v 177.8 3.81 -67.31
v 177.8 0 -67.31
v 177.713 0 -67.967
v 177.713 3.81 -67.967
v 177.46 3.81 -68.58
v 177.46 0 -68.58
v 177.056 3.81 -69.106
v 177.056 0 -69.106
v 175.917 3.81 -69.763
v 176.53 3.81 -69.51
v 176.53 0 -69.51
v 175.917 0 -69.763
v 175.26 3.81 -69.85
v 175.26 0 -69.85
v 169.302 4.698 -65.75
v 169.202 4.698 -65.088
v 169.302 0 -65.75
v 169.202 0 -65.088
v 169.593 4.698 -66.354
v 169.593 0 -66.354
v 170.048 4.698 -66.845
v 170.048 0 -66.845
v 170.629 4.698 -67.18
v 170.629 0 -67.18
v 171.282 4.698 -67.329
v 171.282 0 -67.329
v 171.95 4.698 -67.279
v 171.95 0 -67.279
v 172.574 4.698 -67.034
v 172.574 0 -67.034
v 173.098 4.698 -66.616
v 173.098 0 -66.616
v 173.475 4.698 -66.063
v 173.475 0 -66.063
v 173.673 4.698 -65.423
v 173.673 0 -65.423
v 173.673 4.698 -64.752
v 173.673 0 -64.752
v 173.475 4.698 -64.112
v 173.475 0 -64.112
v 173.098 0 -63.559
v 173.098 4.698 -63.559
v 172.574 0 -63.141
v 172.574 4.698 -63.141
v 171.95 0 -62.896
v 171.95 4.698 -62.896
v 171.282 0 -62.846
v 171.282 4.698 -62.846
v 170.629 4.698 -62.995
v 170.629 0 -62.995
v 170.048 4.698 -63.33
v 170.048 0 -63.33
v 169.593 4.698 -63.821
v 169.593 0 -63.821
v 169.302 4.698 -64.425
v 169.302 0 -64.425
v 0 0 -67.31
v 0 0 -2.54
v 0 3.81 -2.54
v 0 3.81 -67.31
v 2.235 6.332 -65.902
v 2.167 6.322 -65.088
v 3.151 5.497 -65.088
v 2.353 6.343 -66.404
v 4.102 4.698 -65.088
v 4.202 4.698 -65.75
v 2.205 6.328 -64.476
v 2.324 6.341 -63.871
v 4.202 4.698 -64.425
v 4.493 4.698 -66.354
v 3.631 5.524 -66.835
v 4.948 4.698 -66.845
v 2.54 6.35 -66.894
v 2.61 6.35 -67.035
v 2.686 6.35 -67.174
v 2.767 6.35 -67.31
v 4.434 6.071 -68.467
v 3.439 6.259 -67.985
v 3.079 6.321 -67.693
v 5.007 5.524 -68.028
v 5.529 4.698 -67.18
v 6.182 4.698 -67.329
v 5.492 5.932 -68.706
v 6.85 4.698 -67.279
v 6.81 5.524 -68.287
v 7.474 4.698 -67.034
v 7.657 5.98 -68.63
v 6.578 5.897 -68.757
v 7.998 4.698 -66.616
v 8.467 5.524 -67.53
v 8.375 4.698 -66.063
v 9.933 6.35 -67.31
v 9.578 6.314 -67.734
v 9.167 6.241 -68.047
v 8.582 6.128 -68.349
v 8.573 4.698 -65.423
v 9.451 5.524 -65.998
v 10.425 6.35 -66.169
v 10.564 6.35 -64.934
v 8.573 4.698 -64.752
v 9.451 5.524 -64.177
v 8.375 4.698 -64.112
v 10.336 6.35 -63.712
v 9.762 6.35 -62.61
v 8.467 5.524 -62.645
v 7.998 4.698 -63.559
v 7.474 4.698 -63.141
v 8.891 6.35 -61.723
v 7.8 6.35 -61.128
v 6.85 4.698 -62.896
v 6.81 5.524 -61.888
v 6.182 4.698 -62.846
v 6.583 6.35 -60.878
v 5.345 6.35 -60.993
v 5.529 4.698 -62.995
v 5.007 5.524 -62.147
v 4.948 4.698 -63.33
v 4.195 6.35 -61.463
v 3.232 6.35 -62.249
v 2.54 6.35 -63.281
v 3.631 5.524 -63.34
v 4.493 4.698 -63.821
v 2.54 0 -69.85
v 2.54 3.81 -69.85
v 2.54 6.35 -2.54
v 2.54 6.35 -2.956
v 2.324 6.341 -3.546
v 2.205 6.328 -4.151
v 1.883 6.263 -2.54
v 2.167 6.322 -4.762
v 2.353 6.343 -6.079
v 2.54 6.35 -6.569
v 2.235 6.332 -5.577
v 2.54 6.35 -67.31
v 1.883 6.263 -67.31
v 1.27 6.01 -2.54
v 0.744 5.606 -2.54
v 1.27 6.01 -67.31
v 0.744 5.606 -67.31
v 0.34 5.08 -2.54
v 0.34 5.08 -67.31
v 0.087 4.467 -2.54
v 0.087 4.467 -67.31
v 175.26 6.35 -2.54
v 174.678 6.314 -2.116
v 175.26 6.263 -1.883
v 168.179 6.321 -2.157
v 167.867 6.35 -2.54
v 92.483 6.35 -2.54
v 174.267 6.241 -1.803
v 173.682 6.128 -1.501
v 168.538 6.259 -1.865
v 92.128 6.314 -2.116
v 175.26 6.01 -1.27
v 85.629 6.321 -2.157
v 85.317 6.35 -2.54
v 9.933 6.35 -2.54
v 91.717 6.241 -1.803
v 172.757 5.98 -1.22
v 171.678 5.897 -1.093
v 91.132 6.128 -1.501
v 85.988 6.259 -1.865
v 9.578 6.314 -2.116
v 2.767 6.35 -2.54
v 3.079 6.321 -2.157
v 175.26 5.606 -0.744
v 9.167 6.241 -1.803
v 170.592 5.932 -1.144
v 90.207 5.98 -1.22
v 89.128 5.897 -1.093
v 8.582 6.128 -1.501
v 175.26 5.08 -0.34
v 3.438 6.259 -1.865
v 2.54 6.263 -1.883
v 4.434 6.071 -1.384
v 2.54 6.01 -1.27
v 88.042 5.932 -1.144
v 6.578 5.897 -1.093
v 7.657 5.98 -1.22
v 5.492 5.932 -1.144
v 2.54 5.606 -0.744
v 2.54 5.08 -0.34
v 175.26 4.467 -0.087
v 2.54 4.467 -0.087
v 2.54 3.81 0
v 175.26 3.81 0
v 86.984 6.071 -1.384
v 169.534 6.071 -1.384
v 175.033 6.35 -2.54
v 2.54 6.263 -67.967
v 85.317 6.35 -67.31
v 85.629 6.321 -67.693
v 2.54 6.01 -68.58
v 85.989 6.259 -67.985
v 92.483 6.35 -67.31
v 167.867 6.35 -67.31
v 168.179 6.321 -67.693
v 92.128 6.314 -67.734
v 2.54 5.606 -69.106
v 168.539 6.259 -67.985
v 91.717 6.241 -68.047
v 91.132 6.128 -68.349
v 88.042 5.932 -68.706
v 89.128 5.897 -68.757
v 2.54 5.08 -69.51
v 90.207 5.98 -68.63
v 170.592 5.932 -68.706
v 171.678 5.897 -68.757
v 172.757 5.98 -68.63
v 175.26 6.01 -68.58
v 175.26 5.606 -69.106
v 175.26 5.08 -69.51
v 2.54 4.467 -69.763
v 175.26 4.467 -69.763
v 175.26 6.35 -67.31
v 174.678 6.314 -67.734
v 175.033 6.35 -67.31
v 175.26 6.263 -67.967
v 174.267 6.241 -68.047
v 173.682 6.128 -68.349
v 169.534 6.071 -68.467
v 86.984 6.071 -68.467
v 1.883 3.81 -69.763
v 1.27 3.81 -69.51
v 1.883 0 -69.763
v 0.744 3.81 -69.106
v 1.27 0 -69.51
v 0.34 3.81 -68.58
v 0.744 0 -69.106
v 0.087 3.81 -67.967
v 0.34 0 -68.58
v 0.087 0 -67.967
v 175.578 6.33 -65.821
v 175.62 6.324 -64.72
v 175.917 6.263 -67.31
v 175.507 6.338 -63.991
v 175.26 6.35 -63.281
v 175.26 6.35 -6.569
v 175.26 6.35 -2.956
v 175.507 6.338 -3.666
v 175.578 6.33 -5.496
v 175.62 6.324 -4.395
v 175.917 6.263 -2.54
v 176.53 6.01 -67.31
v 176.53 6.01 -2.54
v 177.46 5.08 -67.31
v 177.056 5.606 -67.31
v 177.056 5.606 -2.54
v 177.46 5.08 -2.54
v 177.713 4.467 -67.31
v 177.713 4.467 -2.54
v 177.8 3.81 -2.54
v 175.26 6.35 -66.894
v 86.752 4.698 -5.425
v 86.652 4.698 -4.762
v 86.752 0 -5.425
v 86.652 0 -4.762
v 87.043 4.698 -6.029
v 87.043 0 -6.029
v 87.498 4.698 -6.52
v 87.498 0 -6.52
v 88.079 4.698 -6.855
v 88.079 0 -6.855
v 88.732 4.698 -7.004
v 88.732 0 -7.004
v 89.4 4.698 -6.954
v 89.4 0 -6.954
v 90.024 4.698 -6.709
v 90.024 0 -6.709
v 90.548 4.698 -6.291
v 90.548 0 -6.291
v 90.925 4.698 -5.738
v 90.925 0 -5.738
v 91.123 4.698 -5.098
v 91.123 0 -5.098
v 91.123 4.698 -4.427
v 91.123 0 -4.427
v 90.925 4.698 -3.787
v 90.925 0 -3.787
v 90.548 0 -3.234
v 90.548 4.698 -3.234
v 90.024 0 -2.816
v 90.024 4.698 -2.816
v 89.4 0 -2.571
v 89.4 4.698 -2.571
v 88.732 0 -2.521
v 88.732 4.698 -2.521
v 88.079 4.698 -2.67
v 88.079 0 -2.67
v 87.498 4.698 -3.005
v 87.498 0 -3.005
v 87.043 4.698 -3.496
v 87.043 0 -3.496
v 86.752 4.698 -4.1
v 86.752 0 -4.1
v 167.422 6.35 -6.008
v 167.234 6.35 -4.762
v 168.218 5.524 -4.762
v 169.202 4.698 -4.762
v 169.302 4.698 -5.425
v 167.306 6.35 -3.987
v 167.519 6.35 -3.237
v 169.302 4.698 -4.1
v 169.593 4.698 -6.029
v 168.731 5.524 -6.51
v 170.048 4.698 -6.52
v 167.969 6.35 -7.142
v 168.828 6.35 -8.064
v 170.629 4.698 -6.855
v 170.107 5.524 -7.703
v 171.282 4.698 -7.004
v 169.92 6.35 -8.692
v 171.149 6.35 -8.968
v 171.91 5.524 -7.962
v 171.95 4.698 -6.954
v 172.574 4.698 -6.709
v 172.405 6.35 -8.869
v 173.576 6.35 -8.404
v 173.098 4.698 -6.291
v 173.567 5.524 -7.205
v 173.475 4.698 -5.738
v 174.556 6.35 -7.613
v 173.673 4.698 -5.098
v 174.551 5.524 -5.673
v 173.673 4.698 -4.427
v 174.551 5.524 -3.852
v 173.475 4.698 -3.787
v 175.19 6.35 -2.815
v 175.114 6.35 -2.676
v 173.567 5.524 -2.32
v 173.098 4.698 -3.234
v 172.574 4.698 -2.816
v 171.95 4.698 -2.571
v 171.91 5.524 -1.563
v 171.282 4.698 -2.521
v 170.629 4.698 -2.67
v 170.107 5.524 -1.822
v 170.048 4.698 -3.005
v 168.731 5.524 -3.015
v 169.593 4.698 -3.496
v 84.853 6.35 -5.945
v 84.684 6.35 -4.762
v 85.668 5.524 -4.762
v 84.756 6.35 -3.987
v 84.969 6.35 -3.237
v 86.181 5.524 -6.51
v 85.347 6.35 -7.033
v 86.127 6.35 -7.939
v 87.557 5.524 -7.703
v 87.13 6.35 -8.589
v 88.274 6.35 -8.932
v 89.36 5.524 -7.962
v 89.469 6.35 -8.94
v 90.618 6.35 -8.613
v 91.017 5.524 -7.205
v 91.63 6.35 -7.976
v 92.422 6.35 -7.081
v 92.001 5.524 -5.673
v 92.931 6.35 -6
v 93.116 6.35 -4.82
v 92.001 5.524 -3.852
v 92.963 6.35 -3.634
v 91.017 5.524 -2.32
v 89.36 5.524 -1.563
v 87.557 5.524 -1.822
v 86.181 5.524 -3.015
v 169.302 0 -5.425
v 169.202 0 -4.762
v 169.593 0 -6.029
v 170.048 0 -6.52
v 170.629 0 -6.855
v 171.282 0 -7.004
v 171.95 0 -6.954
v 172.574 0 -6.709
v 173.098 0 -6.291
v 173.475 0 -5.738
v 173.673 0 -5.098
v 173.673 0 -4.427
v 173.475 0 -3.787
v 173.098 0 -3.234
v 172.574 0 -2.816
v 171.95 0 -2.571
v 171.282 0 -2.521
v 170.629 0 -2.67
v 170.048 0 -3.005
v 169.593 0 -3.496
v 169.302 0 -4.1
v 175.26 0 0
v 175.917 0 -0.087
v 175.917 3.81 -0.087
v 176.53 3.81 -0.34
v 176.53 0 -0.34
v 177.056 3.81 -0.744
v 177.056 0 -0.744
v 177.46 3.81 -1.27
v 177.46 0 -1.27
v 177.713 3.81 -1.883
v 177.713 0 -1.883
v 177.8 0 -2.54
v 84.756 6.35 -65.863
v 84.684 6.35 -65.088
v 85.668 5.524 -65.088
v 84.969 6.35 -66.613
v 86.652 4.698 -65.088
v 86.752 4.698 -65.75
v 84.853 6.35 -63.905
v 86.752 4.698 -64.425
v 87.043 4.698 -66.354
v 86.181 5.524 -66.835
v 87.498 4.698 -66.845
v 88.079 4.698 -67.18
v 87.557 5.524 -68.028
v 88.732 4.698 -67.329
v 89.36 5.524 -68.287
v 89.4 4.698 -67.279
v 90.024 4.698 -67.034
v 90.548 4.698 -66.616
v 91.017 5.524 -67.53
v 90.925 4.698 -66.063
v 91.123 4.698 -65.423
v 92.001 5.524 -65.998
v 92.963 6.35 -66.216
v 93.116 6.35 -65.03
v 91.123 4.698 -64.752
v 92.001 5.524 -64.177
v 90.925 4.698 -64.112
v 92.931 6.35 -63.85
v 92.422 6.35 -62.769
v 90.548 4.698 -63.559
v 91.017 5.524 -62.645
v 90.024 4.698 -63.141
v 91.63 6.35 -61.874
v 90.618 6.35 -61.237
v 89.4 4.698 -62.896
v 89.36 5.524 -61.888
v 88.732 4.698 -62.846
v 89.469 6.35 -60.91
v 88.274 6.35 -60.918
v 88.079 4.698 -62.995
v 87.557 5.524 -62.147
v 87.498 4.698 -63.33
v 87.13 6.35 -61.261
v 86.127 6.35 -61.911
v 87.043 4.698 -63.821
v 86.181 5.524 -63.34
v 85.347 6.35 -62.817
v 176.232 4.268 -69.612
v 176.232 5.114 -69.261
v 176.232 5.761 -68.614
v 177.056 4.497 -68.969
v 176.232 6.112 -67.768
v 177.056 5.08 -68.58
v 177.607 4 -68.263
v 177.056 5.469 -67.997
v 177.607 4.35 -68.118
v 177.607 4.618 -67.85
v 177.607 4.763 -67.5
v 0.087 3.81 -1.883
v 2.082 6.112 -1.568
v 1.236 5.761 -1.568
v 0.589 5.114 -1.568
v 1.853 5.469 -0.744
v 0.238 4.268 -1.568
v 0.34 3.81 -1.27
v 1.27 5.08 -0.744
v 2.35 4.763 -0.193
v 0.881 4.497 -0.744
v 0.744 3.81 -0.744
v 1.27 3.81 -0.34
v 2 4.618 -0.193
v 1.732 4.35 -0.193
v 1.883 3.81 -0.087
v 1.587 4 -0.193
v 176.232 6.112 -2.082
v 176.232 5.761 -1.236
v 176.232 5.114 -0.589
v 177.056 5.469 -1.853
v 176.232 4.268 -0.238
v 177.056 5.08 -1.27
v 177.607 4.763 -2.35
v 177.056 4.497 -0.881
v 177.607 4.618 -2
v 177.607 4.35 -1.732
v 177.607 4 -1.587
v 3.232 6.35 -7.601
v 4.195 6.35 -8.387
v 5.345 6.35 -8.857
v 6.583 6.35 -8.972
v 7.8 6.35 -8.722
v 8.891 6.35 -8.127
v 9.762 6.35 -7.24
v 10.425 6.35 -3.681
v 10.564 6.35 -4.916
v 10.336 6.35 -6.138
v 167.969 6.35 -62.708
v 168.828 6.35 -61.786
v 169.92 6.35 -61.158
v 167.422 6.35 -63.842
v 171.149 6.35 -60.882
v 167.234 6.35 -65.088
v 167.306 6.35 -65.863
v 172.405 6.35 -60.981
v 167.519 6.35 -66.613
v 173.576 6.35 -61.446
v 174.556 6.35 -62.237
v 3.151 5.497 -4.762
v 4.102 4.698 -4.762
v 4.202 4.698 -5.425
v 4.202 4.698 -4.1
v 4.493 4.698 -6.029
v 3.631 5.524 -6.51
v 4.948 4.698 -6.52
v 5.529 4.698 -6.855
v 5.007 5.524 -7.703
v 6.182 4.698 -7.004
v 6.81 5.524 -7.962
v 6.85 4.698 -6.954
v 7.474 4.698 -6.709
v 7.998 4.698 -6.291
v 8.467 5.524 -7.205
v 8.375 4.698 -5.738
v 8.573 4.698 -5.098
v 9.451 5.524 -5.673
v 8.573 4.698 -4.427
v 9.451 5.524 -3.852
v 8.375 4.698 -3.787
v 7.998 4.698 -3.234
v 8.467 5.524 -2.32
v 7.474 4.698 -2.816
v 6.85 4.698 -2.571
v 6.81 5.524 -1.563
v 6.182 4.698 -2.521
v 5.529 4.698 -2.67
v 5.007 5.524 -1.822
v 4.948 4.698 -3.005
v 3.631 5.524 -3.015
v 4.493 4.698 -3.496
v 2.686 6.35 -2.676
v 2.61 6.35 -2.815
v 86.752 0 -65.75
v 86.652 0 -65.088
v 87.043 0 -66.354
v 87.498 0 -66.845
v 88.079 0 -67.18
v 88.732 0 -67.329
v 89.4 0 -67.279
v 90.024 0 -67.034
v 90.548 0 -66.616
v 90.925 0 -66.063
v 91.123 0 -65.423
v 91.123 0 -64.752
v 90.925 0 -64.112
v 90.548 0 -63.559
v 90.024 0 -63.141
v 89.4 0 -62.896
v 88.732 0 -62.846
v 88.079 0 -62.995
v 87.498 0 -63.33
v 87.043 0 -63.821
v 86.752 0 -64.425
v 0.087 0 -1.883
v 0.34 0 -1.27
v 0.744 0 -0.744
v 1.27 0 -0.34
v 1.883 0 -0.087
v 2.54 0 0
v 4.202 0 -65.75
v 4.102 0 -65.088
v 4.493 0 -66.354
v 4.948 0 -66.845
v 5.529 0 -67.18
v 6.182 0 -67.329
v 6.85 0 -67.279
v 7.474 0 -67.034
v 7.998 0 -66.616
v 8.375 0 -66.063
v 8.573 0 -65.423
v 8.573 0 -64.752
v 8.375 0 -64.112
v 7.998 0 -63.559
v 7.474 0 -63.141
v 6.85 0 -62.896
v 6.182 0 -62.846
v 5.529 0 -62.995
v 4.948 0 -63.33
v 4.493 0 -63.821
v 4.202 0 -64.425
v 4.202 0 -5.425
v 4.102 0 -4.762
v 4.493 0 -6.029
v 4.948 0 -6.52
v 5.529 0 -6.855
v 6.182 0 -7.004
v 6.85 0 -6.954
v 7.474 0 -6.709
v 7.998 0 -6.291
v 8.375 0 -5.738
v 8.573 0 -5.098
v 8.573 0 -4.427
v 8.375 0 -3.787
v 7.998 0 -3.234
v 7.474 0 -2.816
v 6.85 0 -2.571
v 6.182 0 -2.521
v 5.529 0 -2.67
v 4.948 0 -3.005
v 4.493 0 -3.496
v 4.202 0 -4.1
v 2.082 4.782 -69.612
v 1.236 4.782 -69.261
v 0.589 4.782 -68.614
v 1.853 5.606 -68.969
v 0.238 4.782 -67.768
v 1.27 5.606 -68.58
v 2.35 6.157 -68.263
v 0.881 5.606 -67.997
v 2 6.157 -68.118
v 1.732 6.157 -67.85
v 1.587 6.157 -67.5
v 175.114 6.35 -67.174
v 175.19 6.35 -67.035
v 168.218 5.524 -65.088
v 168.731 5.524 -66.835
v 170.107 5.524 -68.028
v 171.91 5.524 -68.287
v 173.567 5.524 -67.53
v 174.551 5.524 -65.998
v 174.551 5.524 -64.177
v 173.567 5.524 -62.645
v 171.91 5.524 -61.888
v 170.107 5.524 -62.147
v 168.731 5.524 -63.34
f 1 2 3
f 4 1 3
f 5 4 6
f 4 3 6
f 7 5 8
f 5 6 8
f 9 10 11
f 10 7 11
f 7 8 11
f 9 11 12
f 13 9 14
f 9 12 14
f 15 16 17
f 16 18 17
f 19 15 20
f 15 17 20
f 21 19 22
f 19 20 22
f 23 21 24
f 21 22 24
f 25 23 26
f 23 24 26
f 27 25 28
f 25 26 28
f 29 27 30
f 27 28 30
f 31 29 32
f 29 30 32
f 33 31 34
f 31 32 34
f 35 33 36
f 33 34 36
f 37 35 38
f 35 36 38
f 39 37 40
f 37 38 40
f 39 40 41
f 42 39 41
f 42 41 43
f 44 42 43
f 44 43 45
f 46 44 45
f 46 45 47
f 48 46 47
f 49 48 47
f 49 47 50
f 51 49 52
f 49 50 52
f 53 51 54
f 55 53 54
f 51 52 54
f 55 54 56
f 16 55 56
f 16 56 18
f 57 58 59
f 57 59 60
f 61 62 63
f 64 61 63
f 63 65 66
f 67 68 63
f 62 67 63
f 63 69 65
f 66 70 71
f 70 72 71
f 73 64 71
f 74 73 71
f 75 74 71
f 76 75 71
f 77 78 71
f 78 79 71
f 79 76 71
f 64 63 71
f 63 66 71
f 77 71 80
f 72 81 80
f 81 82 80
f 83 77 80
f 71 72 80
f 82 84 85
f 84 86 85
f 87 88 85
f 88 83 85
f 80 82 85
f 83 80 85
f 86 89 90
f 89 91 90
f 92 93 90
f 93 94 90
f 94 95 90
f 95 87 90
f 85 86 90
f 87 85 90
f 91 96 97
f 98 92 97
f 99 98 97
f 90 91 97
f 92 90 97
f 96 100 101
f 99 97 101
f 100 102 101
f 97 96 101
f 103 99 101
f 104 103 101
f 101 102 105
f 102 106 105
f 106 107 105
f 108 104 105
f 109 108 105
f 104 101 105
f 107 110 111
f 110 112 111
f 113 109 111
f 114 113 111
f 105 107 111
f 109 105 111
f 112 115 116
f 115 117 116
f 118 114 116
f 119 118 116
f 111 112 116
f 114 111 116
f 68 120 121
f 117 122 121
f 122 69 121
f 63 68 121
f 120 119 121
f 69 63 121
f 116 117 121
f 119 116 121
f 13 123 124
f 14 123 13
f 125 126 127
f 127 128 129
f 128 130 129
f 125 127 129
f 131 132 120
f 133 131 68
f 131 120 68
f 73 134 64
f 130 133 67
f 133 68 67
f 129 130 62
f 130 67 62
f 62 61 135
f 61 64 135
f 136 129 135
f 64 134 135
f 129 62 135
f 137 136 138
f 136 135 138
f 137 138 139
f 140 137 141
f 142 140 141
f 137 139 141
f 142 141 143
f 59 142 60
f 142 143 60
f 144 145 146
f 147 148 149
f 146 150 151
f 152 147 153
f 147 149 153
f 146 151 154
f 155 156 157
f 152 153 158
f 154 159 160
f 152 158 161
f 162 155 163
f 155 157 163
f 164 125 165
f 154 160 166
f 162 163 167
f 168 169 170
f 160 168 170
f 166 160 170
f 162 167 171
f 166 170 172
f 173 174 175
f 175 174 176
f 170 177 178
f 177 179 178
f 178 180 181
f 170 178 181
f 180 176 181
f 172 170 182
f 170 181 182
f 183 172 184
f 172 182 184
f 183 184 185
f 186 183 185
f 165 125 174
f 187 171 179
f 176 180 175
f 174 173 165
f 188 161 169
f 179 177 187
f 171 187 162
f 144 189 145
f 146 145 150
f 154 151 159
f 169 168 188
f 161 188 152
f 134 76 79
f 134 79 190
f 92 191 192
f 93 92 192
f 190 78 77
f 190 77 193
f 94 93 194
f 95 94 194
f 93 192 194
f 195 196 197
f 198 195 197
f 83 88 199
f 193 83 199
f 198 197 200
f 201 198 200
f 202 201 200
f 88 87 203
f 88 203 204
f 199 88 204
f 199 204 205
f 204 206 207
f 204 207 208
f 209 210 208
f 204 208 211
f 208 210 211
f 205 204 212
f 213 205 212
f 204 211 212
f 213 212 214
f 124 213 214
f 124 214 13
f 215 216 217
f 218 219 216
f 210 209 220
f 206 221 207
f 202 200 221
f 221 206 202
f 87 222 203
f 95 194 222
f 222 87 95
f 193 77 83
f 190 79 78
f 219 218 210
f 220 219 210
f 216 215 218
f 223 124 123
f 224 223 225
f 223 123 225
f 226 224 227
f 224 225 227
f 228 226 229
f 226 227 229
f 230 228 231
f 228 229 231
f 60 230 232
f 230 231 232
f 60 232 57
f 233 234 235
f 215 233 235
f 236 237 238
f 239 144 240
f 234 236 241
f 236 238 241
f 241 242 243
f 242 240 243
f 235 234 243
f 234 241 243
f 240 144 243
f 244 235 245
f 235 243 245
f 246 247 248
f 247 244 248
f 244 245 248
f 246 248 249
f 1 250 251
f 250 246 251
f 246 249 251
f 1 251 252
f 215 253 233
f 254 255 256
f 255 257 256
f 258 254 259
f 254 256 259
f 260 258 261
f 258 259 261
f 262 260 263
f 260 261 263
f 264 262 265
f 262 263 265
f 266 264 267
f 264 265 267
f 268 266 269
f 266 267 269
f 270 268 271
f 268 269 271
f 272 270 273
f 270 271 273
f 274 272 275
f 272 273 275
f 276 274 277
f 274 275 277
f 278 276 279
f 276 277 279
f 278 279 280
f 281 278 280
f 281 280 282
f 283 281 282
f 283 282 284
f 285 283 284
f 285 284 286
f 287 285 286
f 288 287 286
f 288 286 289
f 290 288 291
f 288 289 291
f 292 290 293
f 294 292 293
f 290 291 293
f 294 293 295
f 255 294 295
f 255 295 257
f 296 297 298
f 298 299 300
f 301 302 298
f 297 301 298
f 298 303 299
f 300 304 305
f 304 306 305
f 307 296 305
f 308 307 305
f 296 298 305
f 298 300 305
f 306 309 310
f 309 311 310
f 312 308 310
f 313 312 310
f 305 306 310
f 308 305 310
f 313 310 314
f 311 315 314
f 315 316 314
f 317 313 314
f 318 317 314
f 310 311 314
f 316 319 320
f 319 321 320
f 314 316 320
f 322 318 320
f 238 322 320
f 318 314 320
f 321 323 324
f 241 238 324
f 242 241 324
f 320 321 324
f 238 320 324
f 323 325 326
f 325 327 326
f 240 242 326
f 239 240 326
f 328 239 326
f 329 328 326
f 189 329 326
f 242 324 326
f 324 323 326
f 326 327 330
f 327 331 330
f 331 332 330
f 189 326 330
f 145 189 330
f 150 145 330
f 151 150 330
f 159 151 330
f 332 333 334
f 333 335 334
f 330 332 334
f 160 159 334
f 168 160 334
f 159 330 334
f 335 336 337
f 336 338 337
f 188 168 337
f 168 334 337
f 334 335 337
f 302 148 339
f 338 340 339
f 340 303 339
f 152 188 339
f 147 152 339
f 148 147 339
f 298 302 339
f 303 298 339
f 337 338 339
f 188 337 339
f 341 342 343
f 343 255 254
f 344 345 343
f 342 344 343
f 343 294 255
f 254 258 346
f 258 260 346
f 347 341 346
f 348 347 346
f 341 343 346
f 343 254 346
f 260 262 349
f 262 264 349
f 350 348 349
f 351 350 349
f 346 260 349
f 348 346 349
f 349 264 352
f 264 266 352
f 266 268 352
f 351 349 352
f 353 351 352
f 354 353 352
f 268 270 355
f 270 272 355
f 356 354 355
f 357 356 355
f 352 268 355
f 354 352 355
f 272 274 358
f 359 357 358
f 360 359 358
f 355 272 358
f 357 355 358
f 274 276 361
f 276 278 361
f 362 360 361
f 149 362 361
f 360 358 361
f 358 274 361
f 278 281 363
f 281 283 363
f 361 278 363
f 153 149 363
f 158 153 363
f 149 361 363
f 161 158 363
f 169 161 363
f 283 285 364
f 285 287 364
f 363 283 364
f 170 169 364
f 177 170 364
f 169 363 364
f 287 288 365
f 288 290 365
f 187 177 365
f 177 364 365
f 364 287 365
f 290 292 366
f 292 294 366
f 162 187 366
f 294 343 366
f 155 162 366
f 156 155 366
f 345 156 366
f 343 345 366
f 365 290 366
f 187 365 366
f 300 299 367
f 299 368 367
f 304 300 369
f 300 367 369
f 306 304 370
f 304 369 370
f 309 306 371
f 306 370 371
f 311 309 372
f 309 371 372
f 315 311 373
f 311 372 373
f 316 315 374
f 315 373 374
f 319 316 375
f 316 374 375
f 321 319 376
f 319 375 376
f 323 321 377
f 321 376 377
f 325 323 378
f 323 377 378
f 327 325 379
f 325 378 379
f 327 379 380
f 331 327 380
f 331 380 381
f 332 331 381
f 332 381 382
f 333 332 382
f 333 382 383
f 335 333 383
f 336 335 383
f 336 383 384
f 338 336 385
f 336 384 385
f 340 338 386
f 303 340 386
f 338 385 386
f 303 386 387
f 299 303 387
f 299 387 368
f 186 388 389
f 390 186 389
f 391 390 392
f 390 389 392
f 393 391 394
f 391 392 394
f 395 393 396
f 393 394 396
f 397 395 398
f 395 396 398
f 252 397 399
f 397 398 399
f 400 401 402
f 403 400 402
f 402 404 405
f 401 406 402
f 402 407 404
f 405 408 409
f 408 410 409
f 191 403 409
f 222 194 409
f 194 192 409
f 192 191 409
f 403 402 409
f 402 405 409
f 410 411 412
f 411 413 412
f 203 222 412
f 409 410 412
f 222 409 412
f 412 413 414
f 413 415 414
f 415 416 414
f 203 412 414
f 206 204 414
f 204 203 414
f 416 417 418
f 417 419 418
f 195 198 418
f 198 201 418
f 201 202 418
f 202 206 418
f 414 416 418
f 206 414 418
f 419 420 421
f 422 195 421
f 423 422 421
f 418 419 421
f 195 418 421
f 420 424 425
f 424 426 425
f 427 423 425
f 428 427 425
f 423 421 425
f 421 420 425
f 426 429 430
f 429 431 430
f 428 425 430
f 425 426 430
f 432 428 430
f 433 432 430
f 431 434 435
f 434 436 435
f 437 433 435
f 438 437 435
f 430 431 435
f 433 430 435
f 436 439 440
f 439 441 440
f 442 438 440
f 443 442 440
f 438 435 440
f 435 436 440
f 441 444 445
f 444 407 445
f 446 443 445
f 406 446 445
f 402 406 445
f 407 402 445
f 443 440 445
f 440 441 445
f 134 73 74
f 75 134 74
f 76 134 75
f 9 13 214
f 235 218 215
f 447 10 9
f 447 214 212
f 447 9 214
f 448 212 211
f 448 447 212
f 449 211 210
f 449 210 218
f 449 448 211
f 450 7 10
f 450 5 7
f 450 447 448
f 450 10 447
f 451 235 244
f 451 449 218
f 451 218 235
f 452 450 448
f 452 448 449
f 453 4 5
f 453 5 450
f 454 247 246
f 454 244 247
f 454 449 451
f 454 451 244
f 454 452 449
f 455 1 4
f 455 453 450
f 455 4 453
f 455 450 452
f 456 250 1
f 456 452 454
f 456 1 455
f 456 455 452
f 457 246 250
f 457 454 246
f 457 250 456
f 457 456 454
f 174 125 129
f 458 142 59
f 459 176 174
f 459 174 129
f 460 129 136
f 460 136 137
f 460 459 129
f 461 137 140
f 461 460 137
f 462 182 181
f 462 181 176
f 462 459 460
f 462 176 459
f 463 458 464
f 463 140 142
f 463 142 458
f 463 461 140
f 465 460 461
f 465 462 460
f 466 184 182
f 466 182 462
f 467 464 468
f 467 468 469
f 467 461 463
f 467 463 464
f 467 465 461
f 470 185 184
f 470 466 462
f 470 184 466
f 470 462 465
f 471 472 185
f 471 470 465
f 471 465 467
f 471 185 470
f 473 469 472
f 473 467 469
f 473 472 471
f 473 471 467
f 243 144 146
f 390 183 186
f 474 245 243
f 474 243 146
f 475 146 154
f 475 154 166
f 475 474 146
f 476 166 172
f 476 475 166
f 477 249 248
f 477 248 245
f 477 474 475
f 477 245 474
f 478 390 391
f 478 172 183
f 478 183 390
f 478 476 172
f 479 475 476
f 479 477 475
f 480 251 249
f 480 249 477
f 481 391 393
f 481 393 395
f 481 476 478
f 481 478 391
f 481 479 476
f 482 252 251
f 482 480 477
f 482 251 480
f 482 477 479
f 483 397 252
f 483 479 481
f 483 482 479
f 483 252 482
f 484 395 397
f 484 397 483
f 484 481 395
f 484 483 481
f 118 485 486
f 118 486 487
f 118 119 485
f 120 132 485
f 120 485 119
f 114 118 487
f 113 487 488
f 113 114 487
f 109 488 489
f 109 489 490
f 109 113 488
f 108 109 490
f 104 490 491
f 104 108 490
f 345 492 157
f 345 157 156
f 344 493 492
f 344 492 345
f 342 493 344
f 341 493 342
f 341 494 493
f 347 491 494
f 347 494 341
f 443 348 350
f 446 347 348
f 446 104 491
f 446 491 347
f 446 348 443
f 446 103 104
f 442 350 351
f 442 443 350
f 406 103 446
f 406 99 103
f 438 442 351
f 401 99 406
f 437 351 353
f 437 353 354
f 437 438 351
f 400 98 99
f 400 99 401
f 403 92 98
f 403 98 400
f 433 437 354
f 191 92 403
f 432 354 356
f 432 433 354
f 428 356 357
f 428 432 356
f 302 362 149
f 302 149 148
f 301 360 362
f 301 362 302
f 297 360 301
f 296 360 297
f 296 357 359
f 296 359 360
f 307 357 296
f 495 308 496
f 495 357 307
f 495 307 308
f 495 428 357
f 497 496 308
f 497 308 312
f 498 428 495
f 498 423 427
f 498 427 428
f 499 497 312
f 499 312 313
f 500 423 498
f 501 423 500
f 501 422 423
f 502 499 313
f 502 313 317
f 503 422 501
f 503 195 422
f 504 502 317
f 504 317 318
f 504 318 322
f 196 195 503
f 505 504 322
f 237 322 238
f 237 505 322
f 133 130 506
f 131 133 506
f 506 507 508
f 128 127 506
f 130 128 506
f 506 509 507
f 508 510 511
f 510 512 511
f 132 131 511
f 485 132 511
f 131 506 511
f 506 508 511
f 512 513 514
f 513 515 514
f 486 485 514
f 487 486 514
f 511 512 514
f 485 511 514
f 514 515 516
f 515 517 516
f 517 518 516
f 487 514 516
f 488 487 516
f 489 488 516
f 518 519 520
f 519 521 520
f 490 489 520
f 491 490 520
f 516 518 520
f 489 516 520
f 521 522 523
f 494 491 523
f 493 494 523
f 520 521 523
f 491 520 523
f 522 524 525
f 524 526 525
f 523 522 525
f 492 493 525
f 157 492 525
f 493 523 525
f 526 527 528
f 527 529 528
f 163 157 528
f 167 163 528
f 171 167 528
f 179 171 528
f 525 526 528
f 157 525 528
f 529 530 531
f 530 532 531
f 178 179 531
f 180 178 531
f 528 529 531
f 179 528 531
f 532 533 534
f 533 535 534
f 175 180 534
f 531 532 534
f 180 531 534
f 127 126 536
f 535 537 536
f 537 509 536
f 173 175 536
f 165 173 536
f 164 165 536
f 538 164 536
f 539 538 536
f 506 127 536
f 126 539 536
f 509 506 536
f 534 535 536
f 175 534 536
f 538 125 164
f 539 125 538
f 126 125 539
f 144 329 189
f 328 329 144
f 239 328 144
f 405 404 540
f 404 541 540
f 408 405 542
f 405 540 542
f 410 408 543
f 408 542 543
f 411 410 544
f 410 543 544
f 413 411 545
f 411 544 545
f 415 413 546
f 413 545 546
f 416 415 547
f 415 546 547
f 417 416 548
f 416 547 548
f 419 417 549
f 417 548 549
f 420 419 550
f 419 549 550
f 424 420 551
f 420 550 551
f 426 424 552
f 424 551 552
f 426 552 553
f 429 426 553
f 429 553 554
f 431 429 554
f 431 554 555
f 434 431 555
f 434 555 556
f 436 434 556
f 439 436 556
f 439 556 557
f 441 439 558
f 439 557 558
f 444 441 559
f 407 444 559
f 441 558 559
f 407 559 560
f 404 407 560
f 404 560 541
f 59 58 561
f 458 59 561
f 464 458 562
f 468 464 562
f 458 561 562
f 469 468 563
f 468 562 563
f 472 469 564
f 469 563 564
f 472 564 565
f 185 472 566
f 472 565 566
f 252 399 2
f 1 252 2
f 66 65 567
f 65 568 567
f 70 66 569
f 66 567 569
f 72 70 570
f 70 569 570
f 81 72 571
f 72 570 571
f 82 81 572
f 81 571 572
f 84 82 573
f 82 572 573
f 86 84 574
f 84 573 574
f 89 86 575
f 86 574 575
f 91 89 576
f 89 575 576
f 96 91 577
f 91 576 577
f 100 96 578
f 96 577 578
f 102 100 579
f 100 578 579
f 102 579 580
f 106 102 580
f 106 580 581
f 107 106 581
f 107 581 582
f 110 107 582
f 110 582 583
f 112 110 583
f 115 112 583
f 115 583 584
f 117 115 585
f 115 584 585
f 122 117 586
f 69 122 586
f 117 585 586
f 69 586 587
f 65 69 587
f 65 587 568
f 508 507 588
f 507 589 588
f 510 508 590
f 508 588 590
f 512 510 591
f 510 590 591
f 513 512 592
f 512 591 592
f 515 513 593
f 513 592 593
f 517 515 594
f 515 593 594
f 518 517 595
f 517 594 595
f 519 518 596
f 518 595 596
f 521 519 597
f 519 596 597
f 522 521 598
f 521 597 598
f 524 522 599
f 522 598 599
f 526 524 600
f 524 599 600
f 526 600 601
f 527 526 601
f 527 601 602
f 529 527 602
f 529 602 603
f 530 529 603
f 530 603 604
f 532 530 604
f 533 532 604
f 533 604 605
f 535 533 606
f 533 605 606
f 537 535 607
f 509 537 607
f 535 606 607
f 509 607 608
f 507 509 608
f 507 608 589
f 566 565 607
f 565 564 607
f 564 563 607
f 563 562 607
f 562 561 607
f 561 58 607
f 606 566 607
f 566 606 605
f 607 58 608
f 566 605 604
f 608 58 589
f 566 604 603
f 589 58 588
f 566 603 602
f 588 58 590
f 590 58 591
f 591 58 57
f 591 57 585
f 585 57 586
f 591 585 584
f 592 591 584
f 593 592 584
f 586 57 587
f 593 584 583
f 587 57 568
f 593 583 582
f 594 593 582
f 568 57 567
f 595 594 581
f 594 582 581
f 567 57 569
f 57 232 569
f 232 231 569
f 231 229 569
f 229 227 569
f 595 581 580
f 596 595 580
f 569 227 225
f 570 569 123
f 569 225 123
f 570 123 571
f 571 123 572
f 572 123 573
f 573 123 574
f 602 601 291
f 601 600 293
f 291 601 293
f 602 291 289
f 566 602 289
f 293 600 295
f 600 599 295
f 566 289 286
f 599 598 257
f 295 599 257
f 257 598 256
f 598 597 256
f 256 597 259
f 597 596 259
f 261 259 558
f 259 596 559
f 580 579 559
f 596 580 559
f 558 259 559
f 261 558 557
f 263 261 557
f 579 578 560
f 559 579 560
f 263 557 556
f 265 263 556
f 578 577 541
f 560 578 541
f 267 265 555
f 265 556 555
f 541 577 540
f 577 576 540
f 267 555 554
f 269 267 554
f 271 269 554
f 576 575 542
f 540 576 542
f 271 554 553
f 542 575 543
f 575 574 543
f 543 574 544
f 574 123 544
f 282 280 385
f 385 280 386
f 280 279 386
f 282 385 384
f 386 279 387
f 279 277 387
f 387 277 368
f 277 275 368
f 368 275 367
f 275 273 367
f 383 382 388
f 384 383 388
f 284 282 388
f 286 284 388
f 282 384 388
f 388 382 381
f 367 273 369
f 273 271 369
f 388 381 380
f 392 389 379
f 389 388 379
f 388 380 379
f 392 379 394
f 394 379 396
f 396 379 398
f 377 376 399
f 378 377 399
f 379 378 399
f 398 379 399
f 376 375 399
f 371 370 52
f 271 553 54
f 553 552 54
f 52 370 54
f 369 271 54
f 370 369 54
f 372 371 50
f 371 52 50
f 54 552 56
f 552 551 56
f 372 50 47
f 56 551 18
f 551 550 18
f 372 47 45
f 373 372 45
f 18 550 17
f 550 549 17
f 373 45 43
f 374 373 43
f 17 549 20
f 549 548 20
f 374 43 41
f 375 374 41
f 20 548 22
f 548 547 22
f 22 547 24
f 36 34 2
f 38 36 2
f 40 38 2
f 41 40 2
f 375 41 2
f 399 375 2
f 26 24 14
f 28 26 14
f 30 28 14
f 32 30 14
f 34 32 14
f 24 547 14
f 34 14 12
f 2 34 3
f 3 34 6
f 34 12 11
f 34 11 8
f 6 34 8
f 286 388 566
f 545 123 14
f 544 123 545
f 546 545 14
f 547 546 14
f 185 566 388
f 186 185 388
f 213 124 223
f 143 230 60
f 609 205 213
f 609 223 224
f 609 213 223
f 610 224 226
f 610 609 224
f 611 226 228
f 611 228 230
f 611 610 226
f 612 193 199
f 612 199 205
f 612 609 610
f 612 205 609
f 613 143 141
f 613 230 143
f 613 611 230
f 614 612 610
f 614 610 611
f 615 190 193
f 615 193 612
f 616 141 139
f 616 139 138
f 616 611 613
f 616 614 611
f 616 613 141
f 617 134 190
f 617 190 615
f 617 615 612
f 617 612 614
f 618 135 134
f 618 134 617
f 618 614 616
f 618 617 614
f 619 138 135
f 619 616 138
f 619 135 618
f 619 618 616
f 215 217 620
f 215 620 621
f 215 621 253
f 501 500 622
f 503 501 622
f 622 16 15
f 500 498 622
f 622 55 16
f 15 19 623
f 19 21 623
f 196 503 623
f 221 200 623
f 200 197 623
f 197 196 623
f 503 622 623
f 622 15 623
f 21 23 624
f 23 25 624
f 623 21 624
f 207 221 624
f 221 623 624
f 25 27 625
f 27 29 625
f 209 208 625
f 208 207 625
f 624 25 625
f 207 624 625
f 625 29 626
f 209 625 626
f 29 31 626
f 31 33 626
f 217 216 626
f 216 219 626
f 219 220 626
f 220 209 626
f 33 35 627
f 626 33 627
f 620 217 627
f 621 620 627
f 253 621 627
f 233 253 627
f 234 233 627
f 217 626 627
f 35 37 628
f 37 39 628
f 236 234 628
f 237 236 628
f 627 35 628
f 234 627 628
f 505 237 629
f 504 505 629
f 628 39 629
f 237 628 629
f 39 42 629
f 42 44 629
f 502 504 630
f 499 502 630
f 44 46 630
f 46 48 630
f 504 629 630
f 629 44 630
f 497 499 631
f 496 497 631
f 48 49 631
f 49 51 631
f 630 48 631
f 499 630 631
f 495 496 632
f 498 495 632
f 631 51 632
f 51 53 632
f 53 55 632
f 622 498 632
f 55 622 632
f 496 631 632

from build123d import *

# Parameters (mm, degrees)
SKETCH1_W                                         = 177.8
SKETCH1_H                                         = 69.85
BOSS_EXTRUDE1_DEPTH                               = 6.35
CSK_FOR_8_FLAT_HEAD_MACHINE_SCREW_100_D           = 4.4958
CSK_FOR_8_FLAT_HEAD_MACHINE_SCREW_100_DEPTH       = 12.7
CSK_FOR_8_FLAT_HEAD_MACHINE_SCREW_100_CSINK_D     = 8.4328
CSK_FOR_8_FLAT_HEAD_MACHINE_SCREW_100_CSINK_ANGLE = 100
CSK_FOR_8_FLAT_HEAD_MACHINE_SCREW_100_TIP         = 1.350674586
FILLET1_R                                         = 2.54


with BuildPart() as part:
    # Sketch1 → Boss-Extrude1 (new body)
    with BuildSketch(Plane(origin=(0, 0, 0), x_dir=(1, 0, 0), z_dir=(0, 1, 0))):
        with Locations((88.9, 34.925)):
            Rectangle(SKETCH1_W, SKETCH1_H)
    extrude(amount=BOSS_EXTRUDE1_DEPTH)

    # CSK for #8 Flat Head Machine Screw (100)1
    with Locations(Plane(origin=(0, 6.35, 0), x_dir=(1, 0, 0), z_dir=(0, 1, 0))):
        with Locations((88.9, 65.0875), (6.35, 65.0875), (171.45, 65.0875), (171.45, 4.7625), (88.9, 4.7625), (6.35, 4.7625)):
            CounterSinkHole(CSK_FOR_8_FLAT_HEAD_MACHINE_SCREW_100_D / 2, CSK_FOR_8_FLAT_HEAD_MACHINE_SCREW_100_CSINK_D / 2, depth=CSK_FOR_8_FLAT_HEAD_MACHINE_SCREW_100_DEPTH, counter_sink_angle=CSK_FOR_8_FLAT_HEAD_MACHINE_SCREW_100_CSINK_ANGLE)
            with Locations((0, 0, -(CSK_FOR_8_FLAT_HEAD_MACHINE_SCREW_100_DEPTH + CSK_FOR_8_FLAT_HEAD_MACHINE_SCREW_100_TIP / 2))):  # 118° drill point
                Cone(0, CSK_FOR_8_FLAT_HEAD_MACHINE_SCREW_100_D / 2, CSK_FOR_8_FLAT_HEAD_MACHINE_SCREW_100_TIP, mode=Mode.SUBTRACT)

    # Fillet1
    # the kernel refuses this fillet: 2.54 mm, written as the material it takes off along each edge
    with BuildSketch(Plane(origin=(175.26, 3.81, -2.54), x_dir=(0, 1, 0), z_dir=(1, 0, 0))) as fillet1_piece_1_section:
        Polygon((0, 0), (FILLET1_R, 0), (FILLET1_R, FILLET1_R), (0, FILLET1_R), align=None)
    fillet1_piece_1 = extrude(amount=FILLET1_R, mode=Mode.PRIVATE)
    fillet1_piece_1 = fillet1_piece_1 - Plane(origin=(175.26, 3.81, -2.54), x_dir=(0, -0.7071067811865475, -0.7071067811865475), z_dir=(1, 0, 0)) * Sphere(FILLET1_R, mode=Mode.PRIVATE)
    add(fillet1_piece_1, mode=Mode.SUBTRACT)
    with BuildSketch(Plane(origin=(175.26, 3.81, -67.31), x_dir=(0, 1, 0), z_dir=(1, 0, 0))) as fillet1_piece_2_section:
        Polygon((0, 0), (FILLET1_R, 0), (FILLET1_R, -FILLET1_R), (0, -FILLET1_R), align=None)
    fillet1_piece_2 = extrude(amount=FILLET1_R, mode=Mode.PRIVATE)
    fillet1_piece_2 = fillet1_piece_2 - Plane(origin=(175.26, 3.81, -67.31), x_dir=(0, -0.7071067811865475, 0.7071067811865475), z_dir=(1, 0, 0)) * Sphere(FILLET1_R, mode=Mode.PRIVATE)
    add(fillet1_piece_2, mode=Mode.SUBTRACT)
    with BuildSketch(Plane(origin=(2.54, 3.81, -67.31), x_dir=(0, 0, -1), z_dir=(0, 1, 0))) as fillet1_piece_3_section:
        Polygon((0, 0), (FILLET1_R, 0), (FILLET1_R, FILLET1_R), (0, FILLET1_R), align=None)
    fillet1_piece_3 = extrude(amount=FILLET1_R, mode=Mode.PRIVATE)
    fillet1_piece_3 = fillet1_piece_3 - Plane(origin=(2.54, 3.81, -67.31), x_dir=(0.7071067811865475, 0, 0.7071067811865475), z_dir=(0, 1, 0)) * Sphere(FILLET1_R, mode=Mode.PRIVATE)
    add(fillet1_piece_3, mode=Mode.SUBTRACT)
    with BuildSketch(Plane(origin=(2.54, 3.81, -2.54), x_dir=(0, 1, 0), z_dir=(0, 0, 1))) as fillet1_piece_4_section:
        Polygon((0, 0), (FILLET1_R, 0), (FILLET1_R, FILLET1_R), (0, FILLET1_R), align=None)
    fillet1_piece_4 = extrude(amount=FILLET1_R, mode=Mode.PRIVATE)
    fillet1_piece_4 = fillet1_piece_4 - Plane(origin=(2.54, 3.81, -2.54), x_dir=(0.7071067811865475, -0.7071067811865475, 0), z_dir=(0, 0, 1)) * Sphere(FILLET1_R, mode=Mode.PRIVATE)
    add(fillet1_piece_4, mode=Mode.SUBTRACT)
    with BuildSketch(Plane(origin=(177.8, 6.35, -2.54), x_dir=(-1, 0, 0), z_dir=(0, 0, -1)), Plane(origin=(0, 6.35, -67.31), x_dir=(1, 0, 0), z_dir=(0, 0, 1))) as fillet1_piece_5:
        with BuildLine():
            CenterArc((FILLET1_R, -FILLET1_R), FILLET1_R, 90, 90)
            Line((0, -FILLET1_R), (0, 0))
            Line((0, 0), (FILLET1_R, 0))
        make_face()
    extrude(amount=64.77, mode=Mode.SUBTRACT)
    with BuildSketch(Plane(origin=(175.26, 6.35, -69.85), x_dir=(0, 0, 1), z_dir=(-1, 0, 0))) as fillet1_piece_6:
        with BuildLine():
            CenterArc((FILLET1_R, -FILLET1_R), FILLET1_R, 90, 90)
            Line((0, -FILLET1_R), (0, 0))
            Line((0, 0), (FILLET1_R, 0))
        make_face()
    extrude(amount=172.72, mode=Mode.SUBTRACT)
    with BuildSketch(Plane(origin=(2.54, 6.35, 0), x_dir=(0, -1, 0), z_dir=(1, 0, 0))) as fillet1_piece_7:
        with BuildLine():
            CenterArc((FILLET1_R, FILLET1_R), FILLET1_R, 180, 90)
            Line((0, FILLET1_R), (0, 0))
            Line((0, 0), (FILLET1_R, 0))
        make_face()
    extrude(amount=172.72, mode=Mode.SUBTRACT)
    with BuildSketch(Plane(origin=(0, -6.35, -69.85), x_dir=(1, 0, 0), z_dir=(0, 1, 0)), Plane(origin=(177.8, -6.35, 0), x_dir=(-1, 0, 0), z_dir=(0, 1, 0))) as fillet1_piece_8:
        with BuildLine():
            CenterArc((FILLET1_R, -FILLET1_R), FILLET1_R, 90, 90)
            Line((0, -FILLET1_R), (0, 0))
            Line((0, 0), (FILLET1_R, 0))
        make_face()
    extrude(amount=10.16, mode=Mode.SUBTRACT)
    with BuildSketch(Plane(origin=(177.8, -6.35, -69.85), x_dir=(-1, 0, 0), z_dir=(0, 1, 0)), Plane(origin=(0, -6.35, 0), x_dir=(1, 0, 0), z_dir=(0, 1, 0))) as fillet1_piece_9:
        with BuildLine():
            CenterArc((FILLET1_R, FILLET1_R), FILLET1_R, 180, 90)
            Line((0, FILLET1_R), (0, 0))
            Line((0, 0), (FILLET1_R, 0))
        make_face()
    extrude(amount=10.16, mode=Mode.SUBTRACT)


solid = part.part
